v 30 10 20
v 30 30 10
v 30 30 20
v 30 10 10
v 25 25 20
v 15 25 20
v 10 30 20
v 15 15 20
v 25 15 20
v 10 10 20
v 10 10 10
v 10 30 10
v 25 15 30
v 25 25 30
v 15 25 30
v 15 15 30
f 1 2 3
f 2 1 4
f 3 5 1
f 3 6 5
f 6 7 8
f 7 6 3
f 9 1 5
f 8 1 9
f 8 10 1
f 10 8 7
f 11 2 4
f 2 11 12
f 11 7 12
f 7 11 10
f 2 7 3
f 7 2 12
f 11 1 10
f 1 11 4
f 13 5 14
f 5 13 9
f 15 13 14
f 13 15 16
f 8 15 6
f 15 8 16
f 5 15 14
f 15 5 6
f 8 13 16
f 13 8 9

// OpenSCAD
translate([10,10,10]) union(){
    cube([20,20,10]);
    translate([5,5,0]) cube([10,10,20]);
}
